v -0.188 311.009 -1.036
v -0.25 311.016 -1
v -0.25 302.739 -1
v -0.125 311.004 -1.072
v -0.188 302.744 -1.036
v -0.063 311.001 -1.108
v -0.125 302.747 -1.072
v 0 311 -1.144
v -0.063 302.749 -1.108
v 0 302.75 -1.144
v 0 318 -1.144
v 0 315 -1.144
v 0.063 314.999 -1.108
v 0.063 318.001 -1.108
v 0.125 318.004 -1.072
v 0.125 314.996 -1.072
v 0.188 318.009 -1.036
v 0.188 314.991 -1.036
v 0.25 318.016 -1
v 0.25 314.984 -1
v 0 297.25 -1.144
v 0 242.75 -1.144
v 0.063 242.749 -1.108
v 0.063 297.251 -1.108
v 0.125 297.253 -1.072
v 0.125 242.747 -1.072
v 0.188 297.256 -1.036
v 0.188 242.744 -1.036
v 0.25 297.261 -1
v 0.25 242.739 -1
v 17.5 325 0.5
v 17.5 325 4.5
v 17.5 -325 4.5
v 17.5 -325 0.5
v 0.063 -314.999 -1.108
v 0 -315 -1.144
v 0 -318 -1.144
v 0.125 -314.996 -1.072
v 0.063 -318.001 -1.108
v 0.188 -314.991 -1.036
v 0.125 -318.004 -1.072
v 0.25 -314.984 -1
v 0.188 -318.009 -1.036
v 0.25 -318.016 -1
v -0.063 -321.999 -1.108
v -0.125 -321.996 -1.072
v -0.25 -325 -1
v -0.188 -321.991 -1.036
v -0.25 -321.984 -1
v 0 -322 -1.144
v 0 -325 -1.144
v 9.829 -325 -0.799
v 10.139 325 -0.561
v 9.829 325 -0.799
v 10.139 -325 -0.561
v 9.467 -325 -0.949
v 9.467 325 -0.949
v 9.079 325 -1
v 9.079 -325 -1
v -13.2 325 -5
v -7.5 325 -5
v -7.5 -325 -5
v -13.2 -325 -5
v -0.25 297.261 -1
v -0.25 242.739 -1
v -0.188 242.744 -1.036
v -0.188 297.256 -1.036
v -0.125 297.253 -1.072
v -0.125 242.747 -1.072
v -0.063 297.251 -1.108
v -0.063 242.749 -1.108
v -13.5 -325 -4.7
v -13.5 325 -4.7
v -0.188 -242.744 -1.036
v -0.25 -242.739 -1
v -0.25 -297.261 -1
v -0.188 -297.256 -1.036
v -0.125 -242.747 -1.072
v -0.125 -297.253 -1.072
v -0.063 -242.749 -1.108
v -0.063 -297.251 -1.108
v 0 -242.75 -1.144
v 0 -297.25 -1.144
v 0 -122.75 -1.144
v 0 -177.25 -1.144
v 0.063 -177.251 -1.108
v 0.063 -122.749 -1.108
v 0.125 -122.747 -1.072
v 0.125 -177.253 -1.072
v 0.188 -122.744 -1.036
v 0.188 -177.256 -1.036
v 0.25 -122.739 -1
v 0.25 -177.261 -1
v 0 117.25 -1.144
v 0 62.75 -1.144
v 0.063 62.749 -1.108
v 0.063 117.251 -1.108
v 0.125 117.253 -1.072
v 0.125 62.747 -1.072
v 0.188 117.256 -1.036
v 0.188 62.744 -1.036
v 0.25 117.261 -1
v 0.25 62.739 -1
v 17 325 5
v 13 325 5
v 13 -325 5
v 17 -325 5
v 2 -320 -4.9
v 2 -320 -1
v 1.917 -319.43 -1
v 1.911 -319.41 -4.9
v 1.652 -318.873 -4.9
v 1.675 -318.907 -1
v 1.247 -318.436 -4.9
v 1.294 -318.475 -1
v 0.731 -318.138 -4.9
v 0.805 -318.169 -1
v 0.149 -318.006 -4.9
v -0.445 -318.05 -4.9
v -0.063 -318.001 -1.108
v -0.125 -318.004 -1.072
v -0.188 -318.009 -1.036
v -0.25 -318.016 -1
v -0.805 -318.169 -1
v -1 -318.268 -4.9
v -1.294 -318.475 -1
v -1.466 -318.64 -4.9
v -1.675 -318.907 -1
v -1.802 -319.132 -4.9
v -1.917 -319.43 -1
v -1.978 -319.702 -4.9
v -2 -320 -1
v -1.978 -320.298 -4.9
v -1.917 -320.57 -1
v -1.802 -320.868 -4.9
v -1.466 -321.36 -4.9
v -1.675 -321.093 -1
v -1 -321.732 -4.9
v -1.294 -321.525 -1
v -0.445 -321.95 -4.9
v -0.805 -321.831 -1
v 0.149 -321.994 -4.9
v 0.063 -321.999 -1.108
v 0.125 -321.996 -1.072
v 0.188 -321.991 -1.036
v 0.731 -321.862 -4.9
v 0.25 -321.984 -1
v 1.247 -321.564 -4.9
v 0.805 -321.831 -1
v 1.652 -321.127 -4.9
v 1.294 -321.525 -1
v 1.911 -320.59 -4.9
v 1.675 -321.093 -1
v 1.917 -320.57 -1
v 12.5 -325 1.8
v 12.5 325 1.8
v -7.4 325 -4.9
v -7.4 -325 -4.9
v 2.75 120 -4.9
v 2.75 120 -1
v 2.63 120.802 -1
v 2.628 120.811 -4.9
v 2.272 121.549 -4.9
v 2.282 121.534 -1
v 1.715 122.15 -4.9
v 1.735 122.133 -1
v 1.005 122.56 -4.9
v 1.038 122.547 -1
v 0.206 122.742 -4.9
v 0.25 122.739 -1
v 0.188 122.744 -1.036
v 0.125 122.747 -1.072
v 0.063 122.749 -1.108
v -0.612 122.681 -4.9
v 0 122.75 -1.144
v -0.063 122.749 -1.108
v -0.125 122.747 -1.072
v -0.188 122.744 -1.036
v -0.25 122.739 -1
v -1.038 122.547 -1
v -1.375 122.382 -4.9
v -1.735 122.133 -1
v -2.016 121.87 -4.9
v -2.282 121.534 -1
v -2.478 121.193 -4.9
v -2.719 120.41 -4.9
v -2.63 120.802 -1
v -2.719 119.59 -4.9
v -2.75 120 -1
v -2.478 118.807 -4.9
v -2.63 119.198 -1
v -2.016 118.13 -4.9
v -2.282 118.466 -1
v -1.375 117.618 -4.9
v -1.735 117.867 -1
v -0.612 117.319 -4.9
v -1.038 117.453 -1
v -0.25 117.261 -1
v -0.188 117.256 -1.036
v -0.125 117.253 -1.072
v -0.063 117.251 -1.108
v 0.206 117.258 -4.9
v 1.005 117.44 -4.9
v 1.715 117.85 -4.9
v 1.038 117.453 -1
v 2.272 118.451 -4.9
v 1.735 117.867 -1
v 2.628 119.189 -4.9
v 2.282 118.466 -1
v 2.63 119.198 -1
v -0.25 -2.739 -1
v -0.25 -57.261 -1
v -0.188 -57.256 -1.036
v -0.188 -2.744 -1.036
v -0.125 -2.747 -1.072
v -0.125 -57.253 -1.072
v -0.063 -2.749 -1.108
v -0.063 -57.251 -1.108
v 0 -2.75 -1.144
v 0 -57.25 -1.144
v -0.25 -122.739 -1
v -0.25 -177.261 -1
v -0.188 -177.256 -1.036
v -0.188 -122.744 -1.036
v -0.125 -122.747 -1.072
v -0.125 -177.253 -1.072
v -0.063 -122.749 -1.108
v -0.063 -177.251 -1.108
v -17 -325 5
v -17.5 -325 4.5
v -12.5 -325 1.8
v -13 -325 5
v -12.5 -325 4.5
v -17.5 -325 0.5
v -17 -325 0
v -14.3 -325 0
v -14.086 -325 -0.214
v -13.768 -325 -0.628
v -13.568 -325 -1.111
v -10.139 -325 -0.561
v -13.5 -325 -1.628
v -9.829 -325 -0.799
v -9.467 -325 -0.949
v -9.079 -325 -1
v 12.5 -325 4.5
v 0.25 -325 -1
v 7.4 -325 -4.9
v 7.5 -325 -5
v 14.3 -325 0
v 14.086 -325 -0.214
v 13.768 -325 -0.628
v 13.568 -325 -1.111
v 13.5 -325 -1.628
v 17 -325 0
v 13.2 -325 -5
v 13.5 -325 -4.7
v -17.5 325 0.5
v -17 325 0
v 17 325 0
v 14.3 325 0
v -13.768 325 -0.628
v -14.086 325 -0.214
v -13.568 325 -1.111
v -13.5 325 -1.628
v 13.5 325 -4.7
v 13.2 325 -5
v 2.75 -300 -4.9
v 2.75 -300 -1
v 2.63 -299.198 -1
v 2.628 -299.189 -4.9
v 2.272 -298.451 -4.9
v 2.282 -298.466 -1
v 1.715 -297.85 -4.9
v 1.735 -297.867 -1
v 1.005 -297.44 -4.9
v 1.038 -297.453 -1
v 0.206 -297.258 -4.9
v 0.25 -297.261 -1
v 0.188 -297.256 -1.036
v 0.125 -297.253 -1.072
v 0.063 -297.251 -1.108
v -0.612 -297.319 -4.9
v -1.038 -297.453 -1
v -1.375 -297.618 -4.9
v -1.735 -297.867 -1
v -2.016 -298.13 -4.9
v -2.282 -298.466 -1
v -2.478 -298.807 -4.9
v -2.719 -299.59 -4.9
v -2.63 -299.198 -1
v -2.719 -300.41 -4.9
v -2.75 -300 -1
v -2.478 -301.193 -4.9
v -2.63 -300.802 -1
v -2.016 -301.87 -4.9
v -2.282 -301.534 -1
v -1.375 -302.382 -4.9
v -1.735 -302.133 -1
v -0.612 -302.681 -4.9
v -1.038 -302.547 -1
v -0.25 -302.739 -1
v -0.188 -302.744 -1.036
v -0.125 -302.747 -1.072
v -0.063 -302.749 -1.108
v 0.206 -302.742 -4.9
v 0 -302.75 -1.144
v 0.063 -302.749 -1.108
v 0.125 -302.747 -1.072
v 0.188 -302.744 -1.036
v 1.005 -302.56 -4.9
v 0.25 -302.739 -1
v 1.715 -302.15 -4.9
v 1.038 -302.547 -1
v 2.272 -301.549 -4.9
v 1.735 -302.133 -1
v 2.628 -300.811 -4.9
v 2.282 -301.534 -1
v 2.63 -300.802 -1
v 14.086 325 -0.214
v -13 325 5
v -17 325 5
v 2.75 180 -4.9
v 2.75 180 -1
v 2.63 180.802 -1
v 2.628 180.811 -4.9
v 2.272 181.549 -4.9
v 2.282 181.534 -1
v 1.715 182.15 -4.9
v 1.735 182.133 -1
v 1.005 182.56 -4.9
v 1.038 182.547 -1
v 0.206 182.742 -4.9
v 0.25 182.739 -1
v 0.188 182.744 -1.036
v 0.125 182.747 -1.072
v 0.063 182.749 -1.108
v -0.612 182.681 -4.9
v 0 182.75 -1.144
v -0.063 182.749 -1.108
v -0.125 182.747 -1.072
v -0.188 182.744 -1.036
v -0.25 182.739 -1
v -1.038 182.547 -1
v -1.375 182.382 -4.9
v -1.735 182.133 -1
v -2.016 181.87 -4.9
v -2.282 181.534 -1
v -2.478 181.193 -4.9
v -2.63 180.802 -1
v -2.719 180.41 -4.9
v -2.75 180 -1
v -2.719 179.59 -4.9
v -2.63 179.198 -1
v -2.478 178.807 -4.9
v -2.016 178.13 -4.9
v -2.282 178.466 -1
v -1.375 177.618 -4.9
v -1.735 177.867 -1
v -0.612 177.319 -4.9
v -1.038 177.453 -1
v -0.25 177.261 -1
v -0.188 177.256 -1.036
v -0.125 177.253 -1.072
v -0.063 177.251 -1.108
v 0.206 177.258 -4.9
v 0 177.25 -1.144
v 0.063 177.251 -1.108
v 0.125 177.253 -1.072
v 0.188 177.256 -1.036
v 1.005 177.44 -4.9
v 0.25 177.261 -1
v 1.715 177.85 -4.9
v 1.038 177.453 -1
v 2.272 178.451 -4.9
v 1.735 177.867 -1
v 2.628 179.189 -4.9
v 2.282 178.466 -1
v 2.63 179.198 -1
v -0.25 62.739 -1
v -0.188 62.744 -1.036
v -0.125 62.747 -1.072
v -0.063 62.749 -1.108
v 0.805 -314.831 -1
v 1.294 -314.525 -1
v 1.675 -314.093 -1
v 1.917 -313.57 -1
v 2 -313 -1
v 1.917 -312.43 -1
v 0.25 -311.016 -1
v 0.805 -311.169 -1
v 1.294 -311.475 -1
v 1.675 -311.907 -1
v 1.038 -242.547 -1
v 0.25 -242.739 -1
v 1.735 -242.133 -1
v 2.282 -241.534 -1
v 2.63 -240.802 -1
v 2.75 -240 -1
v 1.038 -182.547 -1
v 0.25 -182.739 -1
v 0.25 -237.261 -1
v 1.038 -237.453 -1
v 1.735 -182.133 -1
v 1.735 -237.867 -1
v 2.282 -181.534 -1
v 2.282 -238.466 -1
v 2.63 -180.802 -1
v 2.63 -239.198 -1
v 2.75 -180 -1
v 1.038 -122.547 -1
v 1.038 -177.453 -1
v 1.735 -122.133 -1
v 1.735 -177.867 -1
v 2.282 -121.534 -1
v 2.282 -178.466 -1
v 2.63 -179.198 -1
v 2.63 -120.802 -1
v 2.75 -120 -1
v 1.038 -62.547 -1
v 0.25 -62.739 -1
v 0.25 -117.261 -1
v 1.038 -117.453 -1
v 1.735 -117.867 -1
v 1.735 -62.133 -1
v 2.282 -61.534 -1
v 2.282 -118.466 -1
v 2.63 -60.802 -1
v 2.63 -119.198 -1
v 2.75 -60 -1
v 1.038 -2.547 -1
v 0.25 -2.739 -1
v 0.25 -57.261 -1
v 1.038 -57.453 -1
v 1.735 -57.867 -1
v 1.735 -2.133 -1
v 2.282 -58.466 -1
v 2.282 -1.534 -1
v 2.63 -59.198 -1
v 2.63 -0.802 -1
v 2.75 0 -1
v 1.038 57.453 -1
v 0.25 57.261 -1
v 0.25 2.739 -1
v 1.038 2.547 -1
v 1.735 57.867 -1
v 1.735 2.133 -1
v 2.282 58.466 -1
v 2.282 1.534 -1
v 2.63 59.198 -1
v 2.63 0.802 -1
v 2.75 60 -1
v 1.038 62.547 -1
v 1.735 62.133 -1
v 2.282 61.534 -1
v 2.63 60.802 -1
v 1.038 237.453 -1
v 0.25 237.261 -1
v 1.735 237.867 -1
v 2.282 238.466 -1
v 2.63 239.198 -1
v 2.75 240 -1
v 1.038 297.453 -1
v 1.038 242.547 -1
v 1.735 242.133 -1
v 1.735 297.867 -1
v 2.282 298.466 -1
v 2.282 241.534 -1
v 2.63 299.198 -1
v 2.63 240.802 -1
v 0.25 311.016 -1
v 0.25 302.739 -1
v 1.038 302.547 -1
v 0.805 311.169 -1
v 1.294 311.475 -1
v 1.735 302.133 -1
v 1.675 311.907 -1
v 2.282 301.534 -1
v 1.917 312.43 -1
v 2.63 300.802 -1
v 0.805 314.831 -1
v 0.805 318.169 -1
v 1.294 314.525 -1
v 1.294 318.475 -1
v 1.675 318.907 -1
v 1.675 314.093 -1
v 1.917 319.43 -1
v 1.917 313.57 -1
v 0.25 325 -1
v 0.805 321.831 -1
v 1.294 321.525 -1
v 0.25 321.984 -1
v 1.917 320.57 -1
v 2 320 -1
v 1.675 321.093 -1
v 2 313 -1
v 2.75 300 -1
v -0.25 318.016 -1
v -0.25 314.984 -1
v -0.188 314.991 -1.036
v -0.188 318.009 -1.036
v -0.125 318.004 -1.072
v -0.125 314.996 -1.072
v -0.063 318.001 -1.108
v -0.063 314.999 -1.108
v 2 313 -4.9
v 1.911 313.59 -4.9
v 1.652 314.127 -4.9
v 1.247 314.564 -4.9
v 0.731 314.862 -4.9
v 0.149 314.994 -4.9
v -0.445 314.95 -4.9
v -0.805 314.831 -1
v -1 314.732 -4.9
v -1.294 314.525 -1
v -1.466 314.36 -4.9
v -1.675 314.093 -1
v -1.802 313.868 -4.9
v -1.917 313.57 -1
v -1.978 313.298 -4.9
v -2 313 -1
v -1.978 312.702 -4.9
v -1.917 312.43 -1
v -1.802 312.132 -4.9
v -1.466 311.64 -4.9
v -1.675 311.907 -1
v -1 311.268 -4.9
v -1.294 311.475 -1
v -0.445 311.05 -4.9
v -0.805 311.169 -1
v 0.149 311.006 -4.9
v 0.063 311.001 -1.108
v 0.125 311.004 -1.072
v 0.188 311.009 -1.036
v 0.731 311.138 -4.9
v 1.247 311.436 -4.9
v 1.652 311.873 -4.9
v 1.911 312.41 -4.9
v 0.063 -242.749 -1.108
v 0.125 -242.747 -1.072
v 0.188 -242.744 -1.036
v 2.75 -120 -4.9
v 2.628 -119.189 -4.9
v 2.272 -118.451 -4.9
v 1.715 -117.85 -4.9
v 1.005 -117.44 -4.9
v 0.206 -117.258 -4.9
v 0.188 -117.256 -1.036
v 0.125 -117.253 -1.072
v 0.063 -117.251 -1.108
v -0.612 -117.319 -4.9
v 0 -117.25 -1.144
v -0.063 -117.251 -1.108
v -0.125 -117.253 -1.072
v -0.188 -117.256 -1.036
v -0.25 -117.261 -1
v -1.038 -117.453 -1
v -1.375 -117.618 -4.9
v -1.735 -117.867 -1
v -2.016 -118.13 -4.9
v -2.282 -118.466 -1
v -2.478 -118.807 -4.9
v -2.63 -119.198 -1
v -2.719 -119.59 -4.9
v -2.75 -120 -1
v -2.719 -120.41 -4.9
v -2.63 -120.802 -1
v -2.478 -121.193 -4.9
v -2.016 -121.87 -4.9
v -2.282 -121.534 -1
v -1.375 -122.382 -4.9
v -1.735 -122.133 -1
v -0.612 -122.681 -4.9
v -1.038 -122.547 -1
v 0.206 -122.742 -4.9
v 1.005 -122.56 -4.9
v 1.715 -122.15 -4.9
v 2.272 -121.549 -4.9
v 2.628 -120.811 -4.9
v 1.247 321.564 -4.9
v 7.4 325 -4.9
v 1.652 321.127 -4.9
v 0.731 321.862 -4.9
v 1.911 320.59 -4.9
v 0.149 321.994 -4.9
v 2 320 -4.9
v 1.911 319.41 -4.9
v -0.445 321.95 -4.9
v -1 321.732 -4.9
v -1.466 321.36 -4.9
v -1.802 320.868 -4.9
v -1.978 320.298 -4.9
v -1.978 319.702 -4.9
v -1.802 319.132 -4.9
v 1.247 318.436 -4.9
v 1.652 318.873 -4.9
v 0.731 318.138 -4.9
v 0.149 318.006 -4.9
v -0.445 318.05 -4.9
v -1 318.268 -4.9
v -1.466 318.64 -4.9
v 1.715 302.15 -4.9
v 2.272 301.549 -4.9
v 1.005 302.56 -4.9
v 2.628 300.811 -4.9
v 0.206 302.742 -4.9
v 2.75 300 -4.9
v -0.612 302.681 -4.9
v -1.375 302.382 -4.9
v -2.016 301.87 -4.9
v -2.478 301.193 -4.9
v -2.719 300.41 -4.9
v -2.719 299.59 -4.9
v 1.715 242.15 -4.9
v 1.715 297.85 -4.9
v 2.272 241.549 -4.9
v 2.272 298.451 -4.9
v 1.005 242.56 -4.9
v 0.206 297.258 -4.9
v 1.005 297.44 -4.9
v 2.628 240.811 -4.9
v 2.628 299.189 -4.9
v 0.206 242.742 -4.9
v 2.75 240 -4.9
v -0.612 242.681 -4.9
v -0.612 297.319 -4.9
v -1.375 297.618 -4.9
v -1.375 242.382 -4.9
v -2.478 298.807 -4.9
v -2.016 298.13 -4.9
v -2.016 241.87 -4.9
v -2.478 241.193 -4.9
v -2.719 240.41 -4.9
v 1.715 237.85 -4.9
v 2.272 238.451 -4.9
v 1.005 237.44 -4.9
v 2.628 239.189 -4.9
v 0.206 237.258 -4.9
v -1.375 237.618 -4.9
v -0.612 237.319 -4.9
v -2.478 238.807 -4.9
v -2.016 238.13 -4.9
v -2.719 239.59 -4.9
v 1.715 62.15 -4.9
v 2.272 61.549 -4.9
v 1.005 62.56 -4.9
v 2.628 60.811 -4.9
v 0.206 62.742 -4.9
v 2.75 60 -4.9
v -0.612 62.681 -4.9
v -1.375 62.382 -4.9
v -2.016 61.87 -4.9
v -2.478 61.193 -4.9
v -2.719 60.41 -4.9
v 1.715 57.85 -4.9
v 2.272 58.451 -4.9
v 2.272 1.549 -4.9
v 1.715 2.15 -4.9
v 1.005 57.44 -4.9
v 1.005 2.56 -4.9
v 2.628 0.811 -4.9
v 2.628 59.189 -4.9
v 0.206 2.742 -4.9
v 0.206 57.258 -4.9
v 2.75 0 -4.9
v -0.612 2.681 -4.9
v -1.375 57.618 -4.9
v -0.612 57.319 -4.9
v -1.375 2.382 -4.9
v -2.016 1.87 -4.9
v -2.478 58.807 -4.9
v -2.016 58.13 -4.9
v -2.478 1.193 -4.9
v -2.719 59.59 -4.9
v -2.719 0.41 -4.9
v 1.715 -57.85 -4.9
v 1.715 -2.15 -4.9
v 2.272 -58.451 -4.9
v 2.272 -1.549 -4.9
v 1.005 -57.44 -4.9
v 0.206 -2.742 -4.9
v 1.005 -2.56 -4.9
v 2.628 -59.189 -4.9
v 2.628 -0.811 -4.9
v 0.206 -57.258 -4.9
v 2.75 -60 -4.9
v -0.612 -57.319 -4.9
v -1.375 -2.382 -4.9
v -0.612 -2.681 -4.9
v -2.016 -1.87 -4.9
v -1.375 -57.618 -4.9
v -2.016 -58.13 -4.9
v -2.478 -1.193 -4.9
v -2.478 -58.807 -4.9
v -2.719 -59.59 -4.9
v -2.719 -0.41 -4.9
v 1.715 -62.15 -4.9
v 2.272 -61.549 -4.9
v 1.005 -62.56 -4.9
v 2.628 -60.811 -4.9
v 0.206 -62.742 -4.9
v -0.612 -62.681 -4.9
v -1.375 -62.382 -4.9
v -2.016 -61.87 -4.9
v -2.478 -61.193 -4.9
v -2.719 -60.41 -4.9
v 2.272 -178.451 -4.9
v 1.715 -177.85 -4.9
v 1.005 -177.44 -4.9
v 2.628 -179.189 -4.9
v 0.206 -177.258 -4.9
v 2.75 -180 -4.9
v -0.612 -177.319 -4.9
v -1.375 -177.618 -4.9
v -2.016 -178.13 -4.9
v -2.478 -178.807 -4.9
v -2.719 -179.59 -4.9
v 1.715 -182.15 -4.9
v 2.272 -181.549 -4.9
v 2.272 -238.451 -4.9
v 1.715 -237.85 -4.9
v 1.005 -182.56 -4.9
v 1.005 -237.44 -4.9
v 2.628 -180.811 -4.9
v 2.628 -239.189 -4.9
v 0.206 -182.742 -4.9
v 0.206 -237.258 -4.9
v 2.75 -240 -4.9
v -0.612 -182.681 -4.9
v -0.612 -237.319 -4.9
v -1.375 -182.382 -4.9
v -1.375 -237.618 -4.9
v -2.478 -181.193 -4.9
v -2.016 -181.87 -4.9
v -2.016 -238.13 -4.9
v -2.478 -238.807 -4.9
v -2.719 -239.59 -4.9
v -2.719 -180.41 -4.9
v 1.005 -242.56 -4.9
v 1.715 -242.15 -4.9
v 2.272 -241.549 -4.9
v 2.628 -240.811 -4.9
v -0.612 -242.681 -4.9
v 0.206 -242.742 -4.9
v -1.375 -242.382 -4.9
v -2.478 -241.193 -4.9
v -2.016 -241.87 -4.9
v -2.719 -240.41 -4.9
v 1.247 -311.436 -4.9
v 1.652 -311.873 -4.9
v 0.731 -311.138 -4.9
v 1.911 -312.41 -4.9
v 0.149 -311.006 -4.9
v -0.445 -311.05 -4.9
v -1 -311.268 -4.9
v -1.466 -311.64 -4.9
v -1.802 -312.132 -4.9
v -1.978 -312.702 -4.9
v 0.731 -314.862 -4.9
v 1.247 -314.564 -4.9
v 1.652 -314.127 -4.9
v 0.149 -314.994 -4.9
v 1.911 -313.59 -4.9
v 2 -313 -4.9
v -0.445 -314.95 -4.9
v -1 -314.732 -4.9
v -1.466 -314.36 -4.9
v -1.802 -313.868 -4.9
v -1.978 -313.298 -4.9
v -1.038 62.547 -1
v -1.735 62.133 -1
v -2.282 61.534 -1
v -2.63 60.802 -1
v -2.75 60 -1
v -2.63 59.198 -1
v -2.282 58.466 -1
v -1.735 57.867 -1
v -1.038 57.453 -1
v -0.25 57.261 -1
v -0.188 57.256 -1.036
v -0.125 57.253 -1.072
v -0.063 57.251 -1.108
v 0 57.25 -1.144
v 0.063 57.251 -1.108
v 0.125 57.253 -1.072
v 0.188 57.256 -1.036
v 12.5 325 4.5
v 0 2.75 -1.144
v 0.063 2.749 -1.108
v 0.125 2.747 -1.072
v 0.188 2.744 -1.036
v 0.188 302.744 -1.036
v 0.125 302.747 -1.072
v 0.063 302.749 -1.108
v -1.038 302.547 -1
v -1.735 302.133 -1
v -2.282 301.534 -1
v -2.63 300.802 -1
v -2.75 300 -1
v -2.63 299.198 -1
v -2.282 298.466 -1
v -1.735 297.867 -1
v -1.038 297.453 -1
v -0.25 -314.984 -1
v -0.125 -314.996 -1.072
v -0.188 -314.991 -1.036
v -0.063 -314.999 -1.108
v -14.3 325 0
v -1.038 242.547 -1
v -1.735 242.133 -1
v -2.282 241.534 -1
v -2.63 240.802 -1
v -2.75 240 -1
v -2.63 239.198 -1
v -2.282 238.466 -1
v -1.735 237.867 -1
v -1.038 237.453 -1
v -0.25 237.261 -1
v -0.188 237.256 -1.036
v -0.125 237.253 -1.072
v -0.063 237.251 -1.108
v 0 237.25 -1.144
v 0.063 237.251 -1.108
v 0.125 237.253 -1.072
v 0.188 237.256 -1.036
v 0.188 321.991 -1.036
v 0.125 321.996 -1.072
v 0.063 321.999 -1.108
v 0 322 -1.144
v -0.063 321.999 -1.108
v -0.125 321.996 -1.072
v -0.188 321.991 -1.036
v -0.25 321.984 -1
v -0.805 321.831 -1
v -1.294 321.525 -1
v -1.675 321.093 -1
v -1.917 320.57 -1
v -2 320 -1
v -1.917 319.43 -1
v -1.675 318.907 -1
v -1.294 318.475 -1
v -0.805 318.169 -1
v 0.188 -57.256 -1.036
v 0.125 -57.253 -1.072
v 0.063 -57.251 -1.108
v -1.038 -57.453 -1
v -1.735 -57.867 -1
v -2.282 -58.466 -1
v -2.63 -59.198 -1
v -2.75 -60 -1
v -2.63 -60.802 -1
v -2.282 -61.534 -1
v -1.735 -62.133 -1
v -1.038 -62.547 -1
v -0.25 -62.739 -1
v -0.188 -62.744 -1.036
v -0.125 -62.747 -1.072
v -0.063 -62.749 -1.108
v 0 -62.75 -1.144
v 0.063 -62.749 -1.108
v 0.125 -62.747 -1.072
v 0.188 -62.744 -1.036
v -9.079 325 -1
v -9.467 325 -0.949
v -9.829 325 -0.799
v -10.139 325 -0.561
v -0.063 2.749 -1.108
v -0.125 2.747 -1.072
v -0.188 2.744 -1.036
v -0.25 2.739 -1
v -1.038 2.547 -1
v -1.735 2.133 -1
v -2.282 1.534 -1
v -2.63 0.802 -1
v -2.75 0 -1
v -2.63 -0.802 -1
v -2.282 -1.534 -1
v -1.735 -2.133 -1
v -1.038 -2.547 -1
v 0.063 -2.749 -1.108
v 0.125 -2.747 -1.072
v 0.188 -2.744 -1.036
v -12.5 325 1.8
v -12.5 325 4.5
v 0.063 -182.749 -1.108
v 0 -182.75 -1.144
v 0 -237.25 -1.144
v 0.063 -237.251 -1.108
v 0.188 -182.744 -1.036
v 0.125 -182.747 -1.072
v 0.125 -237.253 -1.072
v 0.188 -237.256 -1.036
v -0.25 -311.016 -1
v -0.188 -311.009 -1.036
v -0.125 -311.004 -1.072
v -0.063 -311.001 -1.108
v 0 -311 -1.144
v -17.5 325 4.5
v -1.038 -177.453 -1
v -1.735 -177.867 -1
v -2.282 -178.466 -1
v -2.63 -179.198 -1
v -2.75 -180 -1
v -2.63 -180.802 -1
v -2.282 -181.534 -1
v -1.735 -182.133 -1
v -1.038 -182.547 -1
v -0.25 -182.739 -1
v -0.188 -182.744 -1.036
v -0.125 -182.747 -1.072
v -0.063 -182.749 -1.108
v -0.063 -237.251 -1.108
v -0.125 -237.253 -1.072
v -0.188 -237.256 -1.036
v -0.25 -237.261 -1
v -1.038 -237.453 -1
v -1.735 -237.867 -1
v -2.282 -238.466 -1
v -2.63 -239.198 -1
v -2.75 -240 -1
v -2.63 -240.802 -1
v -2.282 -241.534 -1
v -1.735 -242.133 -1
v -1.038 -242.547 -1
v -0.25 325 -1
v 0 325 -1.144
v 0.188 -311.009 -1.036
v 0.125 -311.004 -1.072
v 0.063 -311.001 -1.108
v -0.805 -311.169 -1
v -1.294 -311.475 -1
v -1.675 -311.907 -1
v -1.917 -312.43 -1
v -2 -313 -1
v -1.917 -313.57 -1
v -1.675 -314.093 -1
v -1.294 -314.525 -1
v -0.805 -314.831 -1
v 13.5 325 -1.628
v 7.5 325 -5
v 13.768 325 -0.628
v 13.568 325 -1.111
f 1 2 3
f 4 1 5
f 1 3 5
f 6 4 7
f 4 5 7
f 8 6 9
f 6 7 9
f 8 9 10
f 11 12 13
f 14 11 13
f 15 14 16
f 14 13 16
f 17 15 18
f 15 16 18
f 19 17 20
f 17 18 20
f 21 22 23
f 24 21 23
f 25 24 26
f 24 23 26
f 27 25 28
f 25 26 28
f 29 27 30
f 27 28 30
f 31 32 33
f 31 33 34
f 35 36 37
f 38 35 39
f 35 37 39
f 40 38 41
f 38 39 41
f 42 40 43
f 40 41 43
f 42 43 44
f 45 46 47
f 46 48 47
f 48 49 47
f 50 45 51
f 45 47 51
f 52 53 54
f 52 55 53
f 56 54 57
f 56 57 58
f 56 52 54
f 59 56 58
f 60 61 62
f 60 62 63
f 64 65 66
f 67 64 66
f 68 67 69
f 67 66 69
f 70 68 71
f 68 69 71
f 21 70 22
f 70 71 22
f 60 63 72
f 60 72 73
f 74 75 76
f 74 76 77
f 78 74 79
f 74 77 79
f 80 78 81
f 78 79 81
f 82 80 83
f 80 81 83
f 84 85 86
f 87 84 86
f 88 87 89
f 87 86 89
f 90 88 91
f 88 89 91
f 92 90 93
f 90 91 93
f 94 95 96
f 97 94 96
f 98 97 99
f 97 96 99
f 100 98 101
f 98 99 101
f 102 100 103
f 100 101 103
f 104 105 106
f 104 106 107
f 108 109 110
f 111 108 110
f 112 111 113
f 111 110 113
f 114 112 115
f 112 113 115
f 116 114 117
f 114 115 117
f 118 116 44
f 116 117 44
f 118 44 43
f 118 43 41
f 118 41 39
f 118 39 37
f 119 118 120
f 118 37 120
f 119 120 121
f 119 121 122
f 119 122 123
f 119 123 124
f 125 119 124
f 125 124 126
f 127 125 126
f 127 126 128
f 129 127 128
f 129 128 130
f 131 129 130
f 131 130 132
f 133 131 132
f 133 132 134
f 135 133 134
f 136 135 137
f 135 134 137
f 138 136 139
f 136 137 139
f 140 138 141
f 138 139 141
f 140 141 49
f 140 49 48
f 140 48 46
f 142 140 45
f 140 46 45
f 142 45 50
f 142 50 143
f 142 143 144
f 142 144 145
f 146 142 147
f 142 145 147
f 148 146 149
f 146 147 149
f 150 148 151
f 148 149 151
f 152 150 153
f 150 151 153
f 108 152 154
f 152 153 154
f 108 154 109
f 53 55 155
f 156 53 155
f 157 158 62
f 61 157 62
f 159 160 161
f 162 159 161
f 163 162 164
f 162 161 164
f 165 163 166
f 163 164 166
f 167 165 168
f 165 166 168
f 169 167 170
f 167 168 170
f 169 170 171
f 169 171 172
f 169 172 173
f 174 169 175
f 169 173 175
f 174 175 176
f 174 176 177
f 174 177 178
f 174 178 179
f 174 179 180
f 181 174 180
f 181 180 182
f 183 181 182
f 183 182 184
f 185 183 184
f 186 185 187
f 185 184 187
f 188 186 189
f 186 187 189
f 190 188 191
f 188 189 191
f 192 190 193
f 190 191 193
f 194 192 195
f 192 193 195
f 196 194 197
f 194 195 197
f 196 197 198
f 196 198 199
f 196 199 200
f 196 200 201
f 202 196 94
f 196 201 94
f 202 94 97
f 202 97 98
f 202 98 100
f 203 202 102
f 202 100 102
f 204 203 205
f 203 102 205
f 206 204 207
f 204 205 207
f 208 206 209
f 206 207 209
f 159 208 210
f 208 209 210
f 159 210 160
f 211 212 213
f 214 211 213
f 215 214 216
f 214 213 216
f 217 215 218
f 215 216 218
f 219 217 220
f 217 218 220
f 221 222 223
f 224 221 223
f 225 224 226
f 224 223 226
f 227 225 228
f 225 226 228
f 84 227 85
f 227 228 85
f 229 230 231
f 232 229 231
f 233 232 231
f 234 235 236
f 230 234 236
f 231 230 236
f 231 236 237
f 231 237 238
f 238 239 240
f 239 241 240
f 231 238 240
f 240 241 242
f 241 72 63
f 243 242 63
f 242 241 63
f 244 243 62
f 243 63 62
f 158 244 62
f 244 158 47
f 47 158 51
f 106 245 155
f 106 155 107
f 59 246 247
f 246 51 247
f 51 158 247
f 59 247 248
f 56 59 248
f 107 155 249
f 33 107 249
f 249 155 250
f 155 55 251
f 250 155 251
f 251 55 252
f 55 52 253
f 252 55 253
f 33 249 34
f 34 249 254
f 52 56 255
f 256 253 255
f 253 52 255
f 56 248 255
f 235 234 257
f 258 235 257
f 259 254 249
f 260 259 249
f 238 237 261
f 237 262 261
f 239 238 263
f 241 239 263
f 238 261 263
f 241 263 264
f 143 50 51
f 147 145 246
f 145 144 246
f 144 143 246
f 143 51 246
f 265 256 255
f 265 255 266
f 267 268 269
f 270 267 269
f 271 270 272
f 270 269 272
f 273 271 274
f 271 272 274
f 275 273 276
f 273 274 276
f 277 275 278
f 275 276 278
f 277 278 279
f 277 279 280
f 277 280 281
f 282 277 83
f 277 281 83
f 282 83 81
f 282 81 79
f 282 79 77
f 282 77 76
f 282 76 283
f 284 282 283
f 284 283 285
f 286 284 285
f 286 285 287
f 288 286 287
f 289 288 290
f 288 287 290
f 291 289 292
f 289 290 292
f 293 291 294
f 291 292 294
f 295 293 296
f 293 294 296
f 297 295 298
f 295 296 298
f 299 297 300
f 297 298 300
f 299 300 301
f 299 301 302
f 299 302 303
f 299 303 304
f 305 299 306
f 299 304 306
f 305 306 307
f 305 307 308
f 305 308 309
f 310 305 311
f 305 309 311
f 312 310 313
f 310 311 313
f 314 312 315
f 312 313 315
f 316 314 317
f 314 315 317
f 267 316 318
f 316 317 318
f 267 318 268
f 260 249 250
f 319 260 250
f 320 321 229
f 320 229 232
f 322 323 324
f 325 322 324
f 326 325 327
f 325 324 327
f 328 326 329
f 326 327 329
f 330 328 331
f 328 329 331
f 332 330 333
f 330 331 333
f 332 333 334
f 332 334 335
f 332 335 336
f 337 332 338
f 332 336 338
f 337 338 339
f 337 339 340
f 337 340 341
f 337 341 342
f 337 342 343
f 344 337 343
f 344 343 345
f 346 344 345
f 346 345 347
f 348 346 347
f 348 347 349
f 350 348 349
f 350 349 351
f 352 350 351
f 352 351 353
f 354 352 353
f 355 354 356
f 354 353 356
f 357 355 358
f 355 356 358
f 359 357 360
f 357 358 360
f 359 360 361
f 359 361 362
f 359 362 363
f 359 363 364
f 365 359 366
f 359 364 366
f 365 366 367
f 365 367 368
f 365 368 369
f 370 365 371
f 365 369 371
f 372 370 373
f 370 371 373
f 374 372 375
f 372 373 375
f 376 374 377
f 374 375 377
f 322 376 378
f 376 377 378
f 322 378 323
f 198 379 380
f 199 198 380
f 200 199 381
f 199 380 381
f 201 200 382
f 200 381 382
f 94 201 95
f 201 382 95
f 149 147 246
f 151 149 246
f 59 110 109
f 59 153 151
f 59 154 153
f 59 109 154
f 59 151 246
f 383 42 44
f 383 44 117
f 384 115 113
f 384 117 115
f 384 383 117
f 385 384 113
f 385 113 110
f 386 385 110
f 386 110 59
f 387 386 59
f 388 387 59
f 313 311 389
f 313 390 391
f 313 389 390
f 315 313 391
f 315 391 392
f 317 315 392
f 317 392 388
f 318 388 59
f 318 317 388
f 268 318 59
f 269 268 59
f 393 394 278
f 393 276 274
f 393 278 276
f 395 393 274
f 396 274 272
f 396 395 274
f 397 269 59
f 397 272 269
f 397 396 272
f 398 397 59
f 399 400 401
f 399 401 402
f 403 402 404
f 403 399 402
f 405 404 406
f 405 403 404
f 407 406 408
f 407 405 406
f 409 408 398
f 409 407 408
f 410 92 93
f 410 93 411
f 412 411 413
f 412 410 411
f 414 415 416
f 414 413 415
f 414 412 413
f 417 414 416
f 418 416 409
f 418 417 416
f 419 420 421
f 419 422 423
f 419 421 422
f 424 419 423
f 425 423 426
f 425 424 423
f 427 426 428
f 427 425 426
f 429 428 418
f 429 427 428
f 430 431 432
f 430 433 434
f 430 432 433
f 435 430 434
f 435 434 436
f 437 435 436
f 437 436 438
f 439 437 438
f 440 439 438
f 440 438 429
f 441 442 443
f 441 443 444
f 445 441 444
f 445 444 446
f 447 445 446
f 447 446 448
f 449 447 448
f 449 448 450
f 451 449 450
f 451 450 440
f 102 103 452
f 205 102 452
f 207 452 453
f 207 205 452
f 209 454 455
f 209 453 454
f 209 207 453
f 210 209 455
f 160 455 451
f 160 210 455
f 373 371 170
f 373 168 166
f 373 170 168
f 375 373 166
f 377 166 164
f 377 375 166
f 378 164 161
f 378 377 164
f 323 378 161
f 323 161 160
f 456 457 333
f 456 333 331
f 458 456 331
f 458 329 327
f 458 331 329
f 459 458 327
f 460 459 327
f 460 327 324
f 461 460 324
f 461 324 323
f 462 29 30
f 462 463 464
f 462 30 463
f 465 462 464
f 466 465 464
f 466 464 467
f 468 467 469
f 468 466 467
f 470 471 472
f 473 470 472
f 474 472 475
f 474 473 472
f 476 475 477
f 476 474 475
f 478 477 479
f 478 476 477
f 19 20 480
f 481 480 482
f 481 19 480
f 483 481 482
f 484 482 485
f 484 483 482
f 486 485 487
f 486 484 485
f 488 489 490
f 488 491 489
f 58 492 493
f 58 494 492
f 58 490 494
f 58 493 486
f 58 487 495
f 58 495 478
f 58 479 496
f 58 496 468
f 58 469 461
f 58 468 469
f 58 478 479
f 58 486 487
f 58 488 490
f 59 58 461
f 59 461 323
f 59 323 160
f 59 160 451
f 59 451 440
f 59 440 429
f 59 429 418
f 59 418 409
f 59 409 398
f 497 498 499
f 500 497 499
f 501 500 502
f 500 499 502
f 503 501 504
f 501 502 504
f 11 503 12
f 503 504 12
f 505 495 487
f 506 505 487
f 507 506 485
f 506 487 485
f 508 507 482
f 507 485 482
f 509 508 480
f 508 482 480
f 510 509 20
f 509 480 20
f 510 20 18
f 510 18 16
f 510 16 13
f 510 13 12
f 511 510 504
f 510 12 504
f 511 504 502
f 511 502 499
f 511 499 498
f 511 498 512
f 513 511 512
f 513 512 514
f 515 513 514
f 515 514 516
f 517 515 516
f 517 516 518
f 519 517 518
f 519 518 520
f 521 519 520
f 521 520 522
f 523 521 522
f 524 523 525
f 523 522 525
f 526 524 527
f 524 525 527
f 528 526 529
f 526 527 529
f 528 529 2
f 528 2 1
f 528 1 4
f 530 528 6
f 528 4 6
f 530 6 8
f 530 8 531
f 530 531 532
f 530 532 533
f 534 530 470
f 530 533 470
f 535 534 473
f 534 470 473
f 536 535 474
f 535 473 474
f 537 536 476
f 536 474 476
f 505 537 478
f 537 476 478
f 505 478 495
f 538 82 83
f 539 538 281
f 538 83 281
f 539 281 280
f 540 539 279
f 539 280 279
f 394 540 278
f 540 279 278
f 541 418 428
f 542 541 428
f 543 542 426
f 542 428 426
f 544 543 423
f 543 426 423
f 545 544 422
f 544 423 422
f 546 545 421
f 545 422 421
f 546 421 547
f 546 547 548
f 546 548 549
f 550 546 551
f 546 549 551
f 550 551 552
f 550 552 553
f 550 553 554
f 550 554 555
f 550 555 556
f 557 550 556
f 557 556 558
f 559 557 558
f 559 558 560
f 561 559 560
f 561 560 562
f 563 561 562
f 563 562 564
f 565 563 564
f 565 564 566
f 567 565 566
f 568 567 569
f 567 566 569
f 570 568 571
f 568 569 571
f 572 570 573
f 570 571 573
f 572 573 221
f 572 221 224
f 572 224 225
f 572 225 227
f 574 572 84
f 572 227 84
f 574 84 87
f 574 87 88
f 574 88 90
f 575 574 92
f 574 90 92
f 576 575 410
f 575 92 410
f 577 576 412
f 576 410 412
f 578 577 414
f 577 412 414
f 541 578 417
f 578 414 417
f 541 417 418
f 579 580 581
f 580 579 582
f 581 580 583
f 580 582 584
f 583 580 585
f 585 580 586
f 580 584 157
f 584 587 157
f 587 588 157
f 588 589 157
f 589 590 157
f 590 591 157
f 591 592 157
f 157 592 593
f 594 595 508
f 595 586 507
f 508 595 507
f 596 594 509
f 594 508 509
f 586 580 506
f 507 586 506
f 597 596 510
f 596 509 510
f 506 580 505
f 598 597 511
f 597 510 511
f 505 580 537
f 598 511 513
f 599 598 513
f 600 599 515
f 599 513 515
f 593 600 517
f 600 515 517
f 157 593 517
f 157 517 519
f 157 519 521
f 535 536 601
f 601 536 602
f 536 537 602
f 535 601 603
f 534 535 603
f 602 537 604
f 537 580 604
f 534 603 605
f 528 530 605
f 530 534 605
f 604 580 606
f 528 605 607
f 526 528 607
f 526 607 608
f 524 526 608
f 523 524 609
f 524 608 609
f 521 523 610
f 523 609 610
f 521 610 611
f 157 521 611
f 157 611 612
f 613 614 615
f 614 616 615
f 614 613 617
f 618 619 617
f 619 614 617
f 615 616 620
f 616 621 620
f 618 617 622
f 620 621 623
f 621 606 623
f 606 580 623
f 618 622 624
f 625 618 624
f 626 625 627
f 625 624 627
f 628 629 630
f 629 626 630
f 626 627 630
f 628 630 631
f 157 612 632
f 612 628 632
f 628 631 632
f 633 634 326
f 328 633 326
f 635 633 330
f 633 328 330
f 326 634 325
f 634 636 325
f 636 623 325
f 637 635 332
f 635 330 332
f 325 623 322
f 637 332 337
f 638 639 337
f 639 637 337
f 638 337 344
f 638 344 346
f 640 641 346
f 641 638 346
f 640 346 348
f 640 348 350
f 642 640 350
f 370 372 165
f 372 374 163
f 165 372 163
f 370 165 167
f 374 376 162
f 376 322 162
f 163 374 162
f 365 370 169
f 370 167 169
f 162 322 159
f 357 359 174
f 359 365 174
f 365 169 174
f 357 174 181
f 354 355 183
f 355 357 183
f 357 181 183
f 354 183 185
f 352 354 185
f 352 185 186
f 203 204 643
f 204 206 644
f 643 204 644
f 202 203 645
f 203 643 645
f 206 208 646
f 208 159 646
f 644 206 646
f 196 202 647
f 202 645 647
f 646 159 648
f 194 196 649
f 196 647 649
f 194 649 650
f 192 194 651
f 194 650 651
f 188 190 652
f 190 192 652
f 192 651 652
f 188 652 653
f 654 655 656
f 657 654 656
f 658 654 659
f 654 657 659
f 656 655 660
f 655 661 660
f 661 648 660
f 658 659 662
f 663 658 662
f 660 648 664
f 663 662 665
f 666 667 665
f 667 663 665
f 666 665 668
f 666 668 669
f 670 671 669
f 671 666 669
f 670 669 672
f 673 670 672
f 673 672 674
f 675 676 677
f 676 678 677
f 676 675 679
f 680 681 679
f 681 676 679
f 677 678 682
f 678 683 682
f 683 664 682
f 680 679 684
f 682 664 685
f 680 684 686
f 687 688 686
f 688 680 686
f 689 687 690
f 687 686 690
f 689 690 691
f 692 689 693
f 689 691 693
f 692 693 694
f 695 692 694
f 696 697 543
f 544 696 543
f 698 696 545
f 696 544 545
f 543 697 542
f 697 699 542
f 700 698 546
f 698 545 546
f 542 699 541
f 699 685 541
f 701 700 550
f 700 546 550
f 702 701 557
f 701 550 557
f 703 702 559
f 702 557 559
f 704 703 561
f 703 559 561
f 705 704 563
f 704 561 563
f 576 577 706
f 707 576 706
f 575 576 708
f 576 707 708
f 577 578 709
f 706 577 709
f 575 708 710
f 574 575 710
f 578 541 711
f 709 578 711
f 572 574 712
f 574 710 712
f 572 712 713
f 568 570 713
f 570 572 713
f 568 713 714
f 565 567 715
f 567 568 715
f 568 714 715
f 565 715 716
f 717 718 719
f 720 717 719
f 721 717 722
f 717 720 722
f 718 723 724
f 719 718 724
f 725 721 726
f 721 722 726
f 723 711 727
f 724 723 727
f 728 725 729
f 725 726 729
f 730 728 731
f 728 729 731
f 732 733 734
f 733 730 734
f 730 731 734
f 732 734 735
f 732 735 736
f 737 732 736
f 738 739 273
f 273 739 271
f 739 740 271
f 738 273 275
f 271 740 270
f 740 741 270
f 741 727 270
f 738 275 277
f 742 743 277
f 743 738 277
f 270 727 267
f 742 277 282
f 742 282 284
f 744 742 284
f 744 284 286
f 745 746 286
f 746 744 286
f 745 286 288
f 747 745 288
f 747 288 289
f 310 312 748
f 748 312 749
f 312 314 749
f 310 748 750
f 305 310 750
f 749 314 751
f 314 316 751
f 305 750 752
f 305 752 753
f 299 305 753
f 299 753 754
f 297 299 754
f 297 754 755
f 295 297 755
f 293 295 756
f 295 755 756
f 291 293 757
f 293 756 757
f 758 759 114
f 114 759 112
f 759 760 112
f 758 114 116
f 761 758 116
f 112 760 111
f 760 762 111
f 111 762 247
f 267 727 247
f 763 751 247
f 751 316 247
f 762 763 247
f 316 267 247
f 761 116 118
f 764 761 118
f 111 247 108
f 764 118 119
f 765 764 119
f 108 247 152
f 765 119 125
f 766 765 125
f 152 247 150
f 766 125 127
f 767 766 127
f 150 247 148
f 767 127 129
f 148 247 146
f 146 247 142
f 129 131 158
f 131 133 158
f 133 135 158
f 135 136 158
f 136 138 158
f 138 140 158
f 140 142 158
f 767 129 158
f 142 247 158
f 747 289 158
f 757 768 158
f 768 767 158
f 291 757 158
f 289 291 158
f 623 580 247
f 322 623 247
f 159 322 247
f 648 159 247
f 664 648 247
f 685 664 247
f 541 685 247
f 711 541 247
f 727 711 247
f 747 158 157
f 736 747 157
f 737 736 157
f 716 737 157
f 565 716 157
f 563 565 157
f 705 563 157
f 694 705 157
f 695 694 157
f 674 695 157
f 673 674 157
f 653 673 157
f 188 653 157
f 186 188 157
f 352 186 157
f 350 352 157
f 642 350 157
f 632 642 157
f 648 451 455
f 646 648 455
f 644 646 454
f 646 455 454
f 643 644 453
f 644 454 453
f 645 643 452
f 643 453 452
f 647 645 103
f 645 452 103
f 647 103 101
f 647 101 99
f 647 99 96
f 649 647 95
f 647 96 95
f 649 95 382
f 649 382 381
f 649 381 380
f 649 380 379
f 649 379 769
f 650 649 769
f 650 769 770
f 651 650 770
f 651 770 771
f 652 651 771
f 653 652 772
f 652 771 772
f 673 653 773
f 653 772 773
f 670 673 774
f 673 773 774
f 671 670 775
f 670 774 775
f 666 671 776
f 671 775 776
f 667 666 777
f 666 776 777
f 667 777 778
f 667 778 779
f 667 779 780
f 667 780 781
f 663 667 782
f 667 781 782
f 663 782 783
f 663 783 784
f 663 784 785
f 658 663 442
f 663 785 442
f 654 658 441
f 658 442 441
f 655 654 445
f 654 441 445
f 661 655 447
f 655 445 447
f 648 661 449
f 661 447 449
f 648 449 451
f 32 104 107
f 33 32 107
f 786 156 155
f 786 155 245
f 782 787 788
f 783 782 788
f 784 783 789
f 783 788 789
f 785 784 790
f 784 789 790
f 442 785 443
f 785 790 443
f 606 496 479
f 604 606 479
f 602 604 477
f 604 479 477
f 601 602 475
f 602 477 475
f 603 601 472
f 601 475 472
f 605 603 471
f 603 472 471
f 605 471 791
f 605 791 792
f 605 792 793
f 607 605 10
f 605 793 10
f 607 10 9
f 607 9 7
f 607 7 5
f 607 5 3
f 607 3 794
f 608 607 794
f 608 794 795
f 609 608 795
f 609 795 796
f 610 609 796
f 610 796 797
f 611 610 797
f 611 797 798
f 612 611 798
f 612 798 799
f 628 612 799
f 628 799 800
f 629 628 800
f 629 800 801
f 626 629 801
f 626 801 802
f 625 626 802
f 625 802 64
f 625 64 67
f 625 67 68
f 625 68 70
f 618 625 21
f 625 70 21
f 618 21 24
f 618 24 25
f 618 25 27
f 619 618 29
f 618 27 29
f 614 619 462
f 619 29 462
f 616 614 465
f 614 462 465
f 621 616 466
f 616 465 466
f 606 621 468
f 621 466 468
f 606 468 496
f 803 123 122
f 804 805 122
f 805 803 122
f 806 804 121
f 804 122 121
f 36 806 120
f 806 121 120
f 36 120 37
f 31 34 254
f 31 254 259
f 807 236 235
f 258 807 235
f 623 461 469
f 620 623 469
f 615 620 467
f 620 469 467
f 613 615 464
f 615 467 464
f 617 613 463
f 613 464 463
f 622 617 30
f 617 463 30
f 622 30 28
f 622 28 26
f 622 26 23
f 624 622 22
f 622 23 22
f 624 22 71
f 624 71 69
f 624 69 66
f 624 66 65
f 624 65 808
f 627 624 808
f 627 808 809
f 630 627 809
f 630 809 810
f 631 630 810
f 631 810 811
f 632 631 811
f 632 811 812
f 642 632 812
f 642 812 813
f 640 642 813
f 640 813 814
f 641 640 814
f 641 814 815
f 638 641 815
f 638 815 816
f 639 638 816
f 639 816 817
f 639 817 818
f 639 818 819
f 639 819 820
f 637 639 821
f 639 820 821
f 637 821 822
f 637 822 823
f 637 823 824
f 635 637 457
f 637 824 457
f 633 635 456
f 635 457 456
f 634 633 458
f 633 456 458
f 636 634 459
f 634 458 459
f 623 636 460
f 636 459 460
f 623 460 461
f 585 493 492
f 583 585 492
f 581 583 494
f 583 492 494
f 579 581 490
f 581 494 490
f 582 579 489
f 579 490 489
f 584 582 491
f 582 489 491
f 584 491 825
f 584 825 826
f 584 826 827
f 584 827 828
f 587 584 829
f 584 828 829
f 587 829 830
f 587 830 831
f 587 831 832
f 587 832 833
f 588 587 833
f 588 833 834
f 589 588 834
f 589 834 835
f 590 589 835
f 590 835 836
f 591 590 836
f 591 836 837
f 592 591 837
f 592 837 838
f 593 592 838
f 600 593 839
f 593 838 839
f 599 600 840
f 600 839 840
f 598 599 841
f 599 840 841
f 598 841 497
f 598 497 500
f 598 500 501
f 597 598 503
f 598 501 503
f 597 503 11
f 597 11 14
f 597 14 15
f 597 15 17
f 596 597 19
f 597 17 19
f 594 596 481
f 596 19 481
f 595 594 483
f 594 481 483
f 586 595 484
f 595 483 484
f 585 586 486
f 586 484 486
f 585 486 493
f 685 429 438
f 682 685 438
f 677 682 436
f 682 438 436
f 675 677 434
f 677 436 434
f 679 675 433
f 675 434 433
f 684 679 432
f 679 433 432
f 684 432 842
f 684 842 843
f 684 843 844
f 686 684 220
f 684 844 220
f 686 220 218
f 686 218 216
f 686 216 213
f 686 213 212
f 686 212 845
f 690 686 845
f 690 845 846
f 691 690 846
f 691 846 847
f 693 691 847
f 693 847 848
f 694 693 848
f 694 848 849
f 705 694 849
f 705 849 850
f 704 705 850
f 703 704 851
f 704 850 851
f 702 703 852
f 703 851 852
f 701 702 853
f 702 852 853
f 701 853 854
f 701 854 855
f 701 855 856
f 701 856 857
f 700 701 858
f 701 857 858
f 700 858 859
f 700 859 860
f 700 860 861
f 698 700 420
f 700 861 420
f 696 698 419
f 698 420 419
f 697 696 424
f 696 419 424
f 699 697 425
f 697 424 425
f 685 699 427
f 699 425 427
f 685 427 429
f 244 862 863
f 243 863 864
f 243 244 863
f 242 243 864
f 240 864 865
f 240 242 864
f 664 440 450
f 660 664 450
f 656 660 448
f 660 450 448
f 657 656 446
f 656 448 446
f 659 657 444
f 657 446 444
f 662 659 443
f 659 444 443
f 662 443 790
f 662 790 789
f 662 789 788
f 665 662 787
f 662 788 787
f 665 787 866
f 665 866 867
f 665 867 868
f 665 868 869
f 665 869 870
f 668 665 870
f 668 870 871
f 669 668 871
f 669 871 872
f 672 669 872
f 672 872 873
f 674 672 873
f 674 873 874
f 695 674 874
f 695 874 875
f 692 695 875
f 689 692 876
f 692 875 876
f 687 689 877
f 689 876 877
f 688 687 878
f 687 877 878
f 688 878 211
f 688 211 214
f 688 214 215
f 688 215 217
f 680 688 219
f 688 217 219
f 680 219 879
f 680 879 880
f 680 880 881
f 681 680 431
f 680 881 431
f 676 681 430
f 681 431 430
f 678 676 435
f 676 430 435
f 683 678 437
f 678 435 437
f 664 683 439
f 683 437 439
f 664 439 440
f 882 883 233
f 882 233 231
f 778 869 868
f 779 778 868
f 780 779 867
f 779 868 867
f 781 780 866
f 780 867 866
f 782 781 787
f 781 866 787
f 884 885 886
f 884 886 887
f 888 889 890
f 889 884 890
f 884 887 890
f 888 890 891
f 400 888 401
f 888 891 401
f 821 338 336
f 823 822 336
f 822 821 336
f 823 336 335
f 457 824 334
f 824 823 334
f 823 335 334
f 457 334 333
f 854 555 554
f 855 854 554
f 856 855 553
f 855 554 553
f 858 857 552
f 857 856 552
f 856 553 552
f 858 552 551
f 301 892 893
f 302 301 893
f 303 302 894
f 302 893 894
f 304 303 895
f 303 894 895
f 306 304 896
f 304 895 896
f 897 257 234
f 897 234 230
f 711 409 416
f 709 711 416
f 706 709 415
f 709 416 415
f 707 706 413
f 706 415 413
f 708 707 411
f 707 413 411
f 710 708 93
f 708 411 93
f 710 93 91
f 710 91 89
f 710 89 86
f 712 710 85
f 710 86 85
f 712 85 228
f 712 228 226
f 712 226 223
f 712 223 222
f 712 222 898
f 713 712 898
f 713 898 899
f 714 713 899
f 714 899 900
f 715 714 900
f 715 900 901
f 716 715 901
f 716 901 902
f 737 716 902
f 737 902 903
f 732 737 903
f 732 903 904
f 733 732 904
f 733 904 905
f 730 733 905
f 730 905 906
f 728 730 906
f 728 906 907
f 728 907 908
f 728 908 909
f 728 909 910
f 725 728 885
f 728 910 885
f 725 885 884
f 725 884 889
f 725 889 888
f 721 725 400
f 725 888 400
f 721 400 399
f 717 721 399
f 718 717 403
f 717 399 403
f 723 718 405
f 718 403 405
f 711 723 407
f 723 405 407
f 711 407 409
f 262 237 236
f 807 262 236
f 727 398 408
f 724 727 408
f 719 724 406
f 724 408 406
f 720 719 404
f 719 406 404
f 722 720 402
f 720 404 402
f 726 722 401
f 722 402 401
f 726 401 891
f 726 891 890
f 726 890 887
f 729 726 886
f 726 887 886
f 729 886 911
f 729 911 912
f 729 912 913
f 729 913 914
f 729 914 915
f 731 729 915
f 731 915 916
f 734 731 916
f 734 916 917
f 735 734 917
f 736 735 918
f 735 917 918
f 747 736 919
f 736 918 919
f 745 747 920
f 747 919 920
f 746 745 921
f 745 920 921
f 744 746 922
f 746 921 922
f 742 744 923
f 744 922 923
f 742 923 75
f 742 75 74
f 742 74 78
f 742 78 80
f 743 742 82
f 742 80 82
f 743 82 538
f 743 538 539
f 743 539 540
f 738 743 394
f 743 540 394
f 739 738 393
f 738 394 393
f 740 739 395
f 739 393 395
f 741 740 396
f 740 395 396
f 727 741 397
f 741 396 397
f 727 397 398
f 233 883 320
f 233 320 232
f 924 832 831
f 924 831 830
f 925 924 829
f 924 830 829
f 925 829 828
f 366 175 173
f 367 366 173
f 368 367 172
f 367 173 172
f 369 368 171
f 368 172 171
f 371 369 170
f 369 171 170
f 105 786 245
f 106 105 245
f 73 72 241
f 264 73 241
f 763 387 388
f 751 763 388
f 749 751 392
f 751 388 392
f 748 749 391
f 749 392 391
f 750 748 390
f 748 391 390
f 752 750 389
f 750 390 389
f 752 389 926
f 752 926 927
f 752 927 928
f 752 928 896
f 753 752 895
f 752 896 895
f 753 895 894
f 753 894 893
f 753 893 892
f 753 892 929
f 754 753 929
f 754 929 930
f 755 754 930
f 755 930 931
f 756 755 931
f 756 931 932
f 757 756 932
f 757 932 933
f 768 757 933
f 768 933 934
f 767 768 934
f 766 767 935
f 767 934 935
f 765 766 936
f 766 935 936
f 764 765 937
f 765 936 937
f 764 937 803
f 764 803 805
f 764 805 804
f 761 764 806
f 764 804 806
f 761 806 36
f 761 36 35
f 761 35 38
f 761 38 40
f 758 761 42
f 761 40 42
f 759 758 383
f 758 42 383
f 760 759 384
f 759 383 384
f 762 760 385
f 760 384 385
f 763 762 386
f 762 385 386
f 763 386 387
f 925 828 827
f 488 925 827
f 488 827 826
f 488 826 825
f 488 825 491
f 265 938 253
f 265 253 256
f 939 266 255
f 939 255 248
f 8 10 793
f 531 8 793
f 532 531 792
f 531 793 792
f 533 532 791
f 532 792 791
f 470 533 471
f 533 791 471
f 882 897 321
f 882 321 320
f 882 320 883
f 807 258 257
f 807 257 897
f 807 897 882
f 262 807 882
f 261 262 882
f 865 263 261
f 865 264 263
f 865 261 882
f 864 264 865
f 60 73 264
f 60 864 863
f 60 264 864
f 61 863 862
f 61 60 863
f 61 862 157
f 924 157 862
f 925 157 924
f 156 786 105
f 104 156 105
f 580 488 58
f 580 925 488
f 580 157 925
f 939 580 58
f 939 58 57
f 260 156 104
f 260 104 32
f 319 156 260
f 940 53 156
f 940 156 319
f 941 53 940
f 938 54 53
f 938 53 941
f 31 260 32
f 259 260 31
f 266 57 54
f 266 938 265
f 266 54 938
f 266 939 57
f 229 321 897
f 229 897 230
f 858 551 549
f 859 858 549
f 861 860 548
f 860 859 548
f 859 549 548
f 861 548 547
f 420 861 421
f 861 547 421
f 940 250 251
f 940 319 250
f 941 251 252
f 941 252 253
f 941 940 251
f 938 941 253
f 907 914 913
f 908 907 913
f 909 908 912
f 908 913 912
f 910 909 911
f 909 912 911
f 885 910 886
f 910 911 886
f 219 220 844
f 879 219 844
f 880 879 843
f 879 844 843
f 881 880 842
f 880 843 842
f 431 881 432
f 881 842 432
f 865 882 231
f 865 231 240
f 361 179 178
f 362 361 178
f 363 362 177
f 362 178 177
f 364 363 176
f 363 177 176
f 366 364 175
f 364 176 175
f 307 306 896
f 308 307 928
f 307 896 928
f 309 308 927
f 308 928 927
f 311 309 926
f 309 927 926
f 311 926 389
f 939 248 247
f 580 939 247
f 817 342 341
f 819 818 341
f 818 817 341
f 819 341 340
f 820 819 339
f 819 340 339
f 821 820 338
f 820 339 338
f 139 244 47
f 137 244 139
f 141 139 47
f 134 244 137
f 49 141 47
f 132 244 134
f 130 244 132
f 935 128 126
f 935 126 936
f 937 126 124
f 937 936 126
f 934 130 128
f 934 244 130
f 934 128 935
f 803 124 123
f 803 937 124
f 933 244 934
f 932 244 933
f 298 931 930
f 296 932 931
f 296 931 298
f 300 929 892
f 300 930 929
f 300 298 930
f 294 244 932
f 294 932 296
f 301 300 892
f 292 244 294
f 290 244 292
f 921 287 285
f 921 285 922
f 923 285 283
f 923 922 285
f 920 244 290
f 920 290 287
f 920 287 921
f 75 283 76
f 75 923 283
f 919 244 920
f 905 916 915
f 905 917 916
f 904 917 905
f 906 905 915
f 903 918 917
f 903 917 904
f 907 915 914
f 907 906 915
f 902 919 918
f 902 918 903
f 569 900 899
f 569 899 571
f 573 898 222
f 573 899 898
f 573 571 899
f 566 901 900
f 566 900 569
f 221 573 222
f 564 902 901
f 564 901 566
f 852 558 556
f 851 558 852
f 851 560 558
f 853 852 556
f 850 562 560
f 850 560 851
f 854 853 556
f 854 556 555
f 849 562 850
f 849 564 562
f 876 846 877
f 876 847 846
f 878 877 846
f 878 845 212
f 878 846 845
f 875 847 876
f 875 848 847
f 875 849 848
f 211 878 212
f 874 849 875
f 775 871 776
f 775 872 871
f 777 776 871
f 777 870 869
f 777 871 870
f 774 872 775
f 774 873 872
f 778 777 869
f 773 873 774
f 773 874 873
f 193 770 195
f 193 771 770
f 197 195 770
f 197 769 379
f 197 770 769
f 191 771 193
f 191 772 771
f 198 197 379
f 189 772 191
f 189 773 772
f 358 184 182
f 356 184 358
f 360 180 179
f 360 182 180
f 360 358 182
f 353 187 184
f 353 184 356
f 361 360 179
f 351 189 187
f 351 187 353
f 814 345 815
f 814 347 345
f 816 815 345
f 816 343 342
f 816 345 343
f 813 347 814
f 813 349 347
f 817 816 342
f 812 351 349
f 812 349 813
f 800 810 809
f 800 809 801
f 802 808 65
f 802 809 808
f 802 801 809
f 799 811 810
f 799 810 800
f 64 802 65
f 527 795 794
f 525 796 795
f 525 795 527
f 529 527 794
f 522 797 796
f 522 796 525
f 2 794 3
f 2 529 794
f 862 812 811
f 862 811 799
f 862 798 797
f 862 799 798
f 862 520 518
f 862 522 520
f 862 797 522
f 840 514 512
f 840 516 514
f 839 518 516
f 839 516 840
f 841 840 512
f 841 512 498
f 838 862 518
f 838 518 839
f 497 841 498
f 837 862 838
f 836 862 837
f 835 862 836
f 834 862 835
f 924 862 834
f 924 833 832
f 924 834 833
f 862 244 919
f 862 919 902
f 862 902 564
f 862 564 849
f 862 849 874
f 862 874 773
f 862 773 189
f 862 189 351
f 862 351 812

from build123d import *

# Parameters (mm, degrees)
BOSS_EXTRU_1_DEPTH                  = 650
ENL_V_MAT_EXTRU_1_DEPTH             = 651.254758327
ENL_V_MAT_EXTRU_2_DEPTH             = 650
ENL_V_MAT_EXTRU_3_DEPTH             = 651.254758327
ENL_V_MAT_EXTRU_4_DEPTH             = 650
DIAM_TRE_DU_PER_AGE_5_5_5_5_1_D     = 5.5
DIAM_TRE_DU_PER_AGE_5_5_5_5_1_DEPTH = 9.900000103
CHANFREIN1_SIZE2                    = 0.499999975
CHANFREIN1_SIZE                     = 0.5
CHANFREIN2_SIZE                     = 0.3
CHANFREIN3_SIZE2                    = 0.500000028
CHANFREIN3_SIZE                     = 0.499999997
CHANFREIN4_SIZE                     = 0.5
CHANFREIN4_SIZE2                    = 0.500000014
CONG_1_R                            = 1.499999963
CONG_2_R                            = 1.999999944
ESQUISSE8_R                         = 2
ENL_V_MAT_EXTRU_5_DEPTH             = 10


with BuildPart() as part:
    # Esquisse1 → Boss.-Extru.1 (new body)
    with BuildSketch(Plane(origin=(0, 325, 0), x_dir=(1, 0, 0), z_dir=(0, 1, 0))):
        Polygon((-9.70002034, 1.00000045), (9.70002034, 1.00000045), (12.50002072, -1.79999993), (12.50002072, -4.999999928), (17.50002072, -4.999999928), (17.50002072, 5.000000175), (-17.50002072, 5.000000175), (-17.50002072, -4.999999928), (-12.50002072, -4.999999928), (-12.50002072, -1.79999993), align=None)
    extrude(amount=-BOSS_EXTRU_1_DEPTH)

    # Esquisse2 → Enlèv. mat.-Extru.1 (cut, through all)
    with BuildSketch(Plane.XZ.offset(325)):
        Polygon((-14.30002069, -6.7e-08), (-17.50002072, -6.7e-08), (-17.50002072, -5.000000175), (-13.50002072, -5.000000175), (-13.50002072, -0.799999947), align=None)
    extrude(amount=-ENL_V_MAT_EXTRU_1_DEPTH, mode=Mode.SUBTRACT)

    # Esquisse3 → Enlèv. mat.-Extru.2 (cut)
    with BuildSketch(Plane.XZ.offset(325)):
        Polygon((0.25, -1.000000175), (-0.25, -1.000000175), (1e-09, -1.144337743), align=None)
    extrude(amount=-ENL_V_MAT_EXTRU_2_DEPTH, mode=Mode.SUBTRACT)

    # Esquisse4 → Enlèv. mat.-Extru.3 (cut, through all)
    with BuildSketch(Plane.XZ.offset(325)):
        Polygon((13.50002072, -0.799999925), (13.50002072, -5.000000175), (17.50002072, -5.000000175), (17.50002072, 7.5e-08), (14.30002072, 7.5e-08), align=None)
    extrude(amount=-ENL_V_MAT_EXTRU_3_DEPTH, mode=Mode.SUBTRACT)

    # Esquisse5 → Enlèv. mat.-Extru.4 (cut)
    with BuildSketch(Plane.XZ.offset(325)):
        Polygon((-7.50002072, -5.000000175), (7.50002072, -5.000000175), (7.40002072, -4.900000175), (-7.40002072, -4.900000175), align=None)
    extrude(amount=-ENL_V_MAT_EXTRU_4_DEPTH, mode=Mode.SUBTRACT)

    # Diamètre du perçage Ø5.5 (5.5)1
    with Locations(Plane(origin=(0, 0, -4.900000175), x_dir=(-1, 0, 0), z_dir=(0, 0, -1))):
        with Locations((0, 300), (0, 240), (0, 180), (0, 120), (0, 60), (0, 0), (0, -60), (0, -120), (0, -180), (0, -240), (0, -300)):
            Hole(DIAM_TRE_DU_PER_AGE_5_5_5_5_1_D / 2, depth=DIAM_TRE_DU_PER_AGE_5_5_5_5_1_DEPTH)

    # Chanfrein1
    chanfrein1_edges = [part.edges().sort_by_distance(p)[0] for p in [
        (-17.50002072, 0, 4.999999928),
        (17.50002072, 0, 4.999999928),
    ]]
    chamfer(chanfrein1_edges, length=CHANFREIN1_SIZE, length2=CHANFREIN1_SIZE2)

    # Chanfrein2
    chanfrein2_edges = [part.edges().sort_by_distance(p)[0] for p in [
        (-13.50002072, 0, -5.000000175),
        (13.50002072, 0, -5.000000175),
    ]]
    chamfer(chanfrein2_edges, length=CHANFREIN2_SIZE)

    # Chanfrein3
    chanfrein3_edges = [part.edges().sort_by_distance(p)[0] for p in [
        (-12.50002072, 0, 4.999999928),
        (12.50002072, 0, 4.999999928),
        (-17.50002072, 0, -6.7e-08),
    ]]
    chamfer(chanfrein3_edges, length=CHANFREIN3_SIZE, length2=CHANFREIN3_SIZE2)

    # Chanfrein4
    chanfrein4_edges = [part.edges().sort_by_distance(p)[0] for p in [
        (17.50002072, 0, 7.5e-08),
    ]]
    chanfrein4_side = [part.faces().sort_by_distance(p)[0] for p in [
        (15.90002072, 0, 7.5e-08),
    ]]
    chamfer(chanfrein4_edges, length=CHANFREIN4_SIZE, length2=CHANFREIN4_SIZE2, reference=chanfrein4_side[0])

    # Congé1
    cong_1_edges = [part.edges().sort_by_distance(p)[0] for p in [
        (9.70002034, 0, -1.00000045),
        (-9.70002034, 0, -1.00000045),
    ]]
    fillet(cong_1_edges, radius=CONG_1_R)

    # Congé2
    cong_2_edges = [part.edges().sort_by_distance(p)[0] for p in [
        (-13.50002072, 0, -0.799999947),
        (13.50002072, 0, -0.799999925),
    ]]
    fillet(cong_2_edges, radius=CONG_2_R)

    # Esquisse8 → Enlèv. mat.-Extru.5 (cut)
    with BuildSketch(Plane.XY.offset(-1.00000045)):
        with Locations((1e-09, -313)):
            Circle(ESQUISSE8_R)
        with Locations((1e-09, 313)):
            Circle(ESQUISSE8_R)
        with Locations((0, -320)):
            Circle(ESQUISSE8_R)
        with Locations((0, 320)):
            Circle(ESQUISSE8_R)
    extrude(amount=-ENL_V_MAT_EXTRU_5_DEPTH, mode=Mode.SUBTRACT)


solid = part.part
